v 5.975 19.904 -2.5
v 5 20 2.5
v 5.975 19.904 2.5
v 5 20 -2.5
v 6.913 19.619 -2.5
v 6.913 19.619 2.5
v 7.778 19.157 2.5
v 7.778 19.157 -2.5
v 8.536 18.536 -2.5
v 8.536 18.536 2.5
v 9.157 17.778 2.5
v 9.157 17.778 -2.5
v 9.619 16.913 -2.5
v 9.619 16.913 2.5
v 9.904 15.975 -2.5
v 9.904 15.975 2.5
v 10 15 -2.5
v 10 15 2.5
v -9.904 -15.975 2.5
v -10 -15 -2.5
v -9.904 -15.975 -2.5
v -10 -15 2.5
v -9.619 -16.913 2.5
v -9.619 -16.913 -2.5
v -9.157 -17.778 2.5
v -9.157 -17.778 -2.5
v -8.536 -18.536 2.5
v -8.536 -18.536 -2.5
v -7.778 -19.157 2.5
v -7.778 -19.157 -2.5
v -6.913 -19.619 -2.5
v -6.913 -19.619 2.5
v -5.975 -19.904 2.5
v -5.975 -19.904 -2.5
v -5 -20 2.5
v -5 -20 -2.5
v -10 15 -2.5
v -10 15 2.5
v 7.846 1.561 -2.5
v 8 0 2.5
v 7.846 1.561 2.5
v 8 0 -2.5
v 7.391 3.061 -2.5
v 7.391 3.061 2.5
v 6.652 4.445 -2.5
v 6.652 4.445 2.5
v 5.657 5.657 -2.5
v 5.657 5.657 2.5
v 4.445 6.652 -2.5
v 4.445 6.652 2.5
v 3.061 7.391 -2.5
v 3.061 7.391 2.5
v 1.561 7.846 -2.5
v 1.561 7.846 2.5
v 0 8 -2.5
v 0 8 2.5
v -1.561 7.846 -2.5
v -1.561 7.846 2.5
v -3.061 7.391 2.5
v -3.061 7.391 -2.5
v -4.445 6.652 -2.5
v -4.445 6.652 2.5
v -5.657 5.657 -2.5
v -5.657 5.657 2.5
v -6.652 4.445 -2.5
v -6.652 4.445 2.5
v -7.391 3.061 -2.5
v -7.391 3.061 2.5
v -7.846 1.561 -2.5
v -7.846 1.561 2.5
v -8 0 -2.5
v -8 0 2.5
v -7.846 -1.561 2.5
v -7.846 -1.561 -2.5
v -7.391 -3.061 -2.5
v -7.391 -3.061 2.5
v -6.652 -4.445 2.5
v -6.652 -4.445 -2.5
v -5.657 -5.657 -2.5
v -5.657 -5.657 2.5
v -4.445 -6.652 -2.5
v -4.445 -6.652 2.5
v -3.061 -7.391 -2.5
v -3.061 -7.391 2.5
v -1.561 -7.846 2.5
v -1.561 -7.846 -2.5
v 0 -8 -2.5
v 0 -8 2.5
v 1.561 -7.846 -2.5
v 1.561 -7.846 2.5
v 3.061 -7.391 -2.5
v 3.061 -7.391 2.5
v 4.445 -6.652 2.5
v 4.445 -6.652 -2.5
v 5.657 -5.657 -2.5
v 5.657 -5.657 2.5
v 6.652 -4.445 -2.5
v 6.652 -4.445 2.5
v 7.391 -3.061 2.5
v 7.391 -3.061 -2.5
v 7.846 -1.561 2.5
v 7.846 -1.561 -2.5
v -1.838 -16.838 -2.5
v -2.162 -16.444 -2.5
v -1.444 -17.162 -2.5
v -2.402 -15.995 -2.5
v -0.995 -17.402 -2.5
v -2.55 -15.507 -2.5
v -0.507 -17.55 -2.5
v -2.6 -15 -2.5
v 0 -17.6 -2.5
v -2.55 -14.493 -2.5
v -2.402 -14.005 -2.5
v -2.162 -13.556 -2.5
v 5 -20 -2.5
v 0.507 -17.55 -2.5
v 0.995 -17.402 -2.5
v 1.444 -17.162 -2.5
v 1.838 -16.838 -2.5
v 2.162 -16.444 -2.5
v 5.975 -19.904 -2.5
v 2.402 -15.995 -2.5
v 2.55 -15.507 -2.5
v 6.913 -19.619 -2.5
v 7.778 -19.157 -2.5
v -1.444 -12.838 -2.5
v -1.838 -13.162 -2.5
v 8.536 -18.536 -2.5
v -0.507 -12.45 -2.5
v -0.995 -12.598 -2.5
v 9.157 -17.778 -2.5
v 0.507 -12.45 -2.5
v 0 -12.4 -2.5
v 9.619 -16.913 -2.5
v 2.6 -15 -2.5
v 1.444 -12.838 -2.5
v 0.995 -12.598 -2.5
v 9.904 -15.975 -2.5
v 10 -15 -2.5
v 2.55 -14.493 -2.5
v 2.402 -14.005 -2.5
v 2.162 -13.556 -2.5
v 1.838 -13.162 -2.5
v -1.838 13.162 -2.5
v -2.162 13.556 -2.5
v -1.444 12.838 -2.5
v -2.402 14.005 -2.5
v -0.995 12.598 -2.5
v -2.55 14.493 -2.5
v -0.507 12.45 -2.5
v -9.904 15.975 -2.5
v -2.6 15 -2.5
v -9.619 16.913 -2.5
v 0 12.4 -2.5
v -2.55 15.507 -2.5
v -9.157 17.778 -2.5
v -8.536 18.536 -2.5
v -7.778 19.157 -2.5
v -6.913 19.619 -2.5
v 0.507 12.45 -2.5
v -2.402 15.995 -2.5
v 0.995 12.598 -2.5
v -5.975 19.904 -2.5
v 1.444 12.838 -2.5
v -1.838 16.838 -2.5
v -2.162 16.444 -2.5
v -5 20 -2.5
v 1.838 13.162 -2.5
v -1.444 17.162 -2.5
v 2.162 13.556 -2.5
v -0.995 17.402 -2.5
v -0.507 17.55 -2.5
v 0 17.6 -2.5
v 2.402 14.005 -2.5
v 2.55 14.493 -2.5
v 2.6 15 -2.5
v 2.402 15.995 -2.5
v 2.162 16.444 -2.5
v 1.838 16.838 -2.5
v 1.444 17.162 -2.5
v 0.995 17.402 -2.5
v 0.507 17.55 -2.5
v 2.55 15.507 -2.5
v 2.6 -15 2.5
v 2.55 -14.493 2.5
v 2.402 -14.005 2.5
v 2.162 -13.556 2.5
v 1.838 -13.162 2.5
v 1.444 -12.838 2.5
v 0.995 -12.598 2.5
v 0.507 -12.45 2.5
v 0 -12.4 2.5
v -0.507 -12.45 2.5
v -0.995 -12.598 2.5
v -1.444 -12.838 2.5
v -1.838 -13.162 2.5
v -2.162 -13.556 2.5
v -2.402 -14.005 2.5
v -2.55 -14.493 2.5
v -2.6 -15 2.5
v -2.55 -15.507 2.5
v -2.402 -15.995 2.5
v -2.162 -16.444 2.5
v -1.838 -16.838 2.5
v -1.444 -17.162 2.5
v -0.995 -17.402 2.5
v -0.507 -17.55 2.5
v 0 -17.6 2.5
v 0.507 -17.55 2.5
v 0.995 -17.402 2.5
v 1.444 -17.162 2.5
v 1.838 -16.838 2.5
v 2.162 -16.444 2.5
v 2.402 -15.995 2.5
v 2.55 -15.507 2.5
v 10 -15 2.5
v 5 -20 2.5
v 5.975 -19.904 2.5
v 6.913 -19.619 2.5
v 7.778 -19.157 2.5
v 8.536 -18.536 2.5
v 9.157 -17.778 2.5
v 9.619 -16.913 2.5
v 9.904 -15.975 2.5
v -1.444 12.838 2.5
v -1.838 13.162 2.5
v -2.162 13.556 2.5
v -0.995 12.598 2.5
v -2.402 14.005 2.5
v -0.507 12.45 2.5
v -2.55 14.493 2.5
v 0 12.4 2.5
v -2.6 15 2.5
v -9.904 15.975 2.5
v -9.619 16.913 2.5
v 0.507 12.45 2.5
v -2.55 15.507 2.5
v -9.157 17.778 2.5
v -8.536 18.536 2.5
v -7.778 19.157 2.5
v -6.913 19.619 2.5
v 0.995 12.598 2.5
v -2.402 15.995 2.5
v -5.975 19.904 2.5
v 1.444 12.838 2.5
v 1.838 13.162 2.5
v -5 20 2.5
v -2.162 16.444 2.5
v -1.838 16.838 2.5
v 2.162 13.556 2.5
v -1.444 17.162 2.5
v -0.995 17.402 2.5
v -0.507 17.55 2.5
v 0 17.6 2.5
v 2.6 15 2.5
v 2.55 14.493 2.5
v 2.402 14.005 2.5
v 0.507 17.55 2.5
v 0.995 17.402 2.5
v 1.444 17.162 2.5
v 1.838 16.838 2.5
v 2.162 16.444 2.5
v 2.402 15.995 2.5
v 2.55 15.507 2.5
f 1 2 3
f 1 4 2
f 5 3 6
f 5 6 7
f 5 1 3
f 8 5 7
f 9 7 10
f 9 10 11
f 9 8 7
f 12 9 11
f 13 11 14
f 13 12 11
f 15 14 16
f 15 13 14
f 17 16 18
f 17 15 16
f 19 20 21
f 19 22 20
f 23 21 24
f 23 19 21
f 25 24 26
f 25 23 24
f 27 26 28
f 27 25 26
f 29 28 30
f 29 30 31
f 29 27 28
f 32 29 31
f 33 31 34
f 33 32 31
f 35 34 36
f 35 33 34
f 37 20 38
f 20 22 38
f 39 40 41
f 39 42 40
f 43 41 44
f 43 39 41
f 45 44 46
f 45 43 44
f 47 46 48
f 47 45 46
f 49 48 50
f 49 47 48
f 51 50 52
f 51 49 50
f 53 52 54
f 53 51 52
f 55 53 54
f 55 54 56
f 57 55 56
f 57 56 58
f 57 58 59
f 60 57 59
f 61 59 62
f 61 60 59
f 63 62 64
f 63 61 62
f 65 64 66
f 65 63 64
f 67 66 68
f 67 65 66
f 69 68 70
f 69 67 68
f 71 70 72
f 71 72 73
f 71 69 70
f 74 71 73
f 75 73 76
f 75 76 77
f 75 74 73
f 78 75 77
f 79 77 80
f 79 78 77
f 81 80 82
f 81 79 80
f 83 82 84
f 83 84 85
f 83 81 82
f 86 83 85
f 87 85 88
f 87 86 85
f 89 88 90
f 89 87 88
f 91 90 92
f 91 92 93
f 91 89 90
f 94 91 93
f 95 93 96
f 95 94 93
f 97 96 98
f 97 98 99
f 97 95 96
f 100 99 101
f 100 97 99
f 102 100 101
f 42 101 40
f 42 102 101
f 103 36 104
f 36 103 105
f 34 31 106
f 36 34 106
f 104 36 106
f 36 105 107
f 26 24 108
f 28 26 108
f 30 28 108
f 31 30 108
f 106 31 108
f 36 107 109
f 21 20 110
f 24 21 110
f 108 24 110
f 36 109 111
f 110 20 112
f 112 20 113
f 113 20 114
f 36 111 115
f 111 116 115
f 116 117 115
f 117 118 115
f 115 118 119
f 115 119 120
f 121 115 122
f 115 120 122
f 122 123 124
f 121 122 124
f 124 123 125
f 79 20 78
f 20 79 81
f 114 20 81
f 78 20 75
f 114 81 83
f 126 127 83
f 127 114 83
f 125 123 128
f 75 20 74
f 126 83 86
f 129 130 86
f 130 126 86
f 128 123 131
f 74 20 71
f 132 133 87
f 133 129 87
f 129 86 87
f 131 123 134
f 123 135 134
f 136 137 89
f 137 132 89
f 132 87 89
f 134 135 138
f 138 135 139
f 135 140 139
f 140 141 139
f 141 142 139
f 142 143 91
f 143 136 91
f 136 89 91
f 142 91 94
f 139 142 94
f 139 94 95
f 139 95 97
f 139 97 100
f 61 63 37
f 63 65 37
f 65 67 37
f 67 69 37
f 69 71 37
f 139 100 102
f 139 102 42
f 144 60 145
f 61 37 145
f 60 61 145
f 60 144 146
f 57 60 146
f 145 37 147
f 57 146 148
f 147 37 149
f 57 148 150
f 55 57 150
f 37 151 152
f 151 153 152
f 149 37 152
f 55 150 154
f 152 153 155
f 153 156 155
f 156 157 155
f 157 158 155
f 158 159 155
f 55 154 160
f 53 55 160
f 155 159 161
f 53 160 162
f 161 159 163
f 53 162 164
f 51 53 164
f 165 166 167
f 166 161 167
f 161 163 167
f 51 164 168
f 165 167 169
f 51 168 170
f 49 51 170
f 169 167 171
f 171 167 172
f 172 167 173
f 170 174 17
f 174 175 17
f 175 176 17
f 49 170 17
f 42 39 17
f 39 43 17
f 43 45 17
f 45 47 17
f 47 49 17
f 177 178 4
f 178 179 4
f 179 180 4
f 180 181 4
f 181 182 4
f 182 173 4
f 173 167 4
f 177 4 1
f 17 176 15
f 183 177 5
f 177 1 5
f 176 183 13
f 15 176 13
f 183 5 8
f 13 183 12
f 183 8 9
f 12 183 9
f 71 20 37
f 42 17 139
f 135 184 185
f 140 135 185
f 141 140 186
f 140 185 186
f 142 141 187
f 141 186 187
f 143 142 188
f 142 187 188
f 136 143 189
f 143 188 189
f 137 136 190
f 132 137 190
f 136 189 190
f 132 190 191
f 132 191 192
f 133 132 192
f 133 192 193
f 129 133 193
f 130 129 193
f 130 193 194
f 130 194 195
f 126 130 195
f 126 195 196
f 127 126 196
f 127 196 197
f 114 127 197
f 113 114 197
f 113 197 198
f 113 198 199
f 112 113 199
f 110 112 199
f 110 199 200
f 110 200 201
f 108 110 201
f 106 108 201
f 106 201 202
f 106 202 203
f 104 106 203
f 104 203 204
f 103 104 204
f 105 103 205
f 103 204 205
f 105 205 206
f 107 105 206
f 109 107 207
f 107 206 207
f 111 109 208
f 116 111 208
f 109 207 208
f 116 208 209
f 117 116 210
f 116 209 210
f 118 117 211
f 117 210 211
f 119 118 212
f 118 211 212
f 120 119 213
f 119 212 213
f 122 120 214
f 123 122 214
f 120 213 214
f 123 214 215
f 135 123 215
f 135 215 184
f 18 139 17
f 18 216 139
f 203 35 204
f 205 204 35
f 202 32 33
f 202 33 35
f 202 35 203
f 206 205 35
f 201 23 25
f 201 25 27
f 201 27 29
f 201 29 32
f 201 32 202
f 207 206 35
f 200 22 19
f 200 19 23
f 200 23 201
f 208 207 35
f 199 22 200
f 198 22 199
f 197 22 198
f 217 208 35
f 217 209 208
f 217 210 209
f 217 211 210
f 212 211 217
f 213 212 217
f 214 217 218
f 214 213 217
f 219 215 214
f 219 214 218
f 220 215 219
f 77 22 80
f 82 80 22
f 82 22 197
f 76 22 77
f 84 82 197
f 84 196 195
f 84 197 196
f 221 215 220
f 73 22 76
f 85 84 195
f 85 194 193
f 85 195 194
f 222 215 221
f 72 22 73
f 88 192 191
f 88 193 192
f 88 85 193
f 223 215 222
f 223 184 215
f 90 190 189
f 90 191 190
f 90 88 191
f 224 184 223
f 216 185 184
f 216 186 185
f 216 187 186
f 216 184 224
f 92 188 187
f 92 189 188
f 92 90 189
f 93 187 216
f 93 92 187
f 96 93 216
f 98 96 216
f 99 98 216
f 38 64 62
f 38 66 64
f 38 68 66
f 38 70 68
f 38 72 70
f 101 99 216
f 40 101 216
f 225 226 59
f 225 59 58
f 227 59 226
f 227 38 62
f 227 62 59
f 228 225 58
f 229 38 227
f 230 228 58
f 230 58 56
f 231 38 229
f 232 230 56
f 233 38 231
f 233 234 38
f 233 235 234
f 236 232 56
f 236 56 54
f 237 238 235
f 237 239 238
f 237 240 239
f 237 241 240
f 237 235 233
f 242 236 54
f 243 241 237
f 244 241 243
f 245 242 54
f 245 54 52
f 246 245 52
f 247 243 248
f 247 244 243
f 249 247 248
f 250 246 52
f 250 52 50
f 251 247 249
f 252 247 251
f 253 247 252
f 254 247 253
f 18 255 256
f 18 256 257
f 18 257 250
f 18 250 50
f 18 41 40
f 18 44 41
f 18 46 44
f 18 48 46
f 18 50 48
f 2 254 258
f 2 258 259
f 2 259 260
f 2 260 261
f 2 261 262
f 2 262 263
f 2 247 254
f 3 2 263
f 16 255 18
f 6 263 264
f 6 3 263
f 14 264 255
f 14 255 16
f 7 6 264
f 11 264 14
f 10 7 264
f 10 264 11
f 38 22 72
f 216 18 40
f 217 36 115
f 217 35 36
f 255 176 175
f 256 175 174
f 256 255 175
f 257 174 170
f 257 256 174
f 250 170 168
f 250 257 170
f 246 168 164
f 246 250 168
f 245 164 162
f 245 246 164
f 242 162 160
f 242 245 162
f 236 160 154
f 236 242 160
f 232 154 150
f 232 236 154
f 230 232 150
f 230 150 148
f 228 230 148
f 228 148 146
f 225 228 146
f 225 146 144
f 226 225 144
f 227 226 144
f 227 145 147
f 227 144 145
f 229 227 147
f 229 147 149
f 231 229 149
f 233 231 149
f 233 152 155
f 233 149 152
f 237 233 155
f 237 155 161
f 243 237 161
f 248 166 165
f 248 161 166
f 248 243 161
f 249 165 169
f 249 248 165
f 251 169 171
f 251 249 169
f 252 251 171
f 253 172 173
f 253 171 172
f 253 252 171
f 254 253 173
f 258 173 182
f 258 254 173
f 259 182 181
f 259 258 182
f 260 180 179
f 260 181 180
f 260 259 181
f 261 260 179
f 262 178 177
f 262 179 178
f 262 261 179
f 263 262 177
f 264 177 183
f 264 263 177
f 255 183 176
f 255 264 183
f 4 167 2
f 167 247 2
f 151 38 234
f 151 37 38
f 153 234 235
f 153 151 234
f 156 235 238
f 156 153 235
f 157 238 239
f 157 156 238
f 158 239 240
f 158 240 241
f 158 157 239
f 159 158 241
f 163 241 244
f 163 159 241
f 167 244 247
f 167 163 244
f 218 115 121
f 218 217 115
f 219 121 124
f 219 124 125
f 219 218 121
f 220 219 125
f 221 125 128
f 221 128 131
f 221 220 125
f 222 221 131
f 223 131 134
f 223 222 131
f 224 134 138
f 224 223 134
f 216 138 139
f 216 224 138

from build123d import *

# Parameters (mm, degrees)
ESBO_O1_W                = 20
ESBO_O1_H                = 40
ESBO_O1_R                = 8
RESSALTO_EXTRUS_O1_DEPTH = 2.5
ESBO_O2_R                = 2.6
CORTE_EXTRUS_O1_DEPTH    = 23.912878475
FILETE1_R                = 5


with BuildPart() as part:
    # Esboço1 → Ressalto-extrusão1 (new, symmetric)
    with BuildSketch(Plane.XY):
        Rectangle(ESBO_O1_W, ESBO_O1_H)
        Circle(ESBO_O1_R, mode=Mode.SUBTRACT)
    extrude(amount=RESSALTO_EXTRUS_O1_DEPTH, both=True)

    # Esboço2 → Corte-extrusão1 (cut, through all)
    with BuildSketch(Plane.XY.offset(2.5)):
        with Locations((0, -15)):
            Circle(ESBO_O2_R)
    corte_extrus_o1 = extrude(amount=-CORTE_EXTRUS_O1_DEPTH, mode=Mode.SUBTRACT)

    # Espelhar1: Corte-extrusão1 across plane
    add(corte_extrus_o1.mirror(Plane.ZX), mode=Mode.SUBTRACT)

    # Filete1
    filete1_edges = [part.edges().sort_by_distance(p)[0] for p in [
        (10, -20, 0),
        (-10, -20, 0),
        (-10, 20, 0),
        (10, 20, 0),
    ]]
    fillet(filete1_edges, radius=FILETE1_R)


solid = part.part
